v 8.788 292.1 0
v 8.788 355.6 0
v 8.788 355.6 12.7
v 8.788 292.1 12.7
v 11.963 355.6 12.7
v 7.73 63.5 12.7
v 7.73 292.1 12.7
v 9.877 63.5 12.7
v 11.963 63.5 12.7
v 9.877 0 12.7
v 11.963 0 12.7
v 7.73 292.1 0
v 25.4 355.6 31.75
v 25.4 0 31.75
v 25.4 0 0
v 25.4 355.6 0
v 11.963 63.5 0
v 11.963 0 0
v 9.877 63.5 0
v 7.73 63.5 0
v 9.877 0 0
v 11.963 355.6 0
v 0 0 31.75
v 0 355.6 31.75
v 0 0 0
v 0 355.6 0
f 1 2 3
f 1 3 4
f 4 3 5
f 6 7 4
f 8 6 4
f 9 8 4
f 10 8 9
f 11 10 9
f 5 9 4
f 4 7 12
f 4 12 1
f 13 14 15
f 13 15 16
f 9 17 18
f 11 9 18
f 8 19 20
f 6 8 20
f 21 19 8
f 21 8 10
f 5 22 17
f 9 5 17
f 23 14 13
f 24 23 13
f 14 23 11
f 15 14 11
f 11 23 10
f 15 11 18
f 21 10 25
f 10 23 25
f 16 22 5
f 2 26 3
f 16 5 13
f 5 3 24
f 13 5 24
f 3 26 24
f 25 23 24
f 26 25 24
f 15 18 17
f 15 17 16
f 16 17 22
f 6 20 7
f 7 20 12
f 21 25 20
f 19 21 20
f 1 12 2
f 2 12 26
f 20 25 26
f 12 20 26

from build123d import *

# Parameters (mm, degrees)
F1_DEPTH = 25.4
F2_W     = 3.175
F2_H     = 63.5
F2_W_2   = 2.085983
F3_DEPTH = 12.7
F4_W     = 355.6
F4_H     = 58.603869
F5_DEPTH = 25.4


with BuildPart() as f1:
    # F0 (on Right) → F1 (new body)
    with BuildSketch(Plane.YZ):
        with BuildLine():
            Line((0, 19.445715), (0, 0))
            Line((0, 0), (355.6, 0))
            Line((355.6, 0), (355.6, 19.445715))
            Line((355.6, 19.445715), (355.6, 31.75))
            Line((355.6, 31.75), (343.690661, 32.121079))
            ThreePointArc((343.690661, 32.121079), (300.578253, 39.833745), (260.35, 57.15))
            ThreePointArc((260.35, 57.15), (177.8, 76.307596), (95.25, 57.15))
            ThreePointArc((95.25, 57.15), (55.021747, 39.833745), (11.909339, 32.121079))
            Line((11.909339, 32.121079), (0, 31.75))
            Line((0, 31.75), (0, 19.445715))
        make_face()
    extrude(amount=F1_DEPTH)

    # F2 (on face) → F3 (cut)
    with BuildSketch(Plane(origin=(0, 0, 0), x_dir=(1, 0, 0), z_dir=(0, 0, -1))):
        Polygon((11.9634, -292.1), (11.9634, -63.5), (9.877417, -63.5), (7.730067, -63.5), (7.730067, -292.1), (8.7884, -292.1), align=None)
        with Locations((10.3759, -323.85)):
            Rectangle(F2_W, F2_H)
        with Locations((10.920409, -31.75)):
            Rectangle(F2_W_2, F2_H)
    extrude(amount=-F3_DEPTH, mode=Mode.SUBTRACT)

    # F4 (on face) → F5 (cut)
    with BuildSketch(Plane.YZ.offset(25.4)):
        with Locations((177.8, 61.051934)):
            Rectangle(F4_W, F4_H)
    extrude(amount=-F5_DEPTH, mode=Mode.SUBTRACT)


solid = f1.part
